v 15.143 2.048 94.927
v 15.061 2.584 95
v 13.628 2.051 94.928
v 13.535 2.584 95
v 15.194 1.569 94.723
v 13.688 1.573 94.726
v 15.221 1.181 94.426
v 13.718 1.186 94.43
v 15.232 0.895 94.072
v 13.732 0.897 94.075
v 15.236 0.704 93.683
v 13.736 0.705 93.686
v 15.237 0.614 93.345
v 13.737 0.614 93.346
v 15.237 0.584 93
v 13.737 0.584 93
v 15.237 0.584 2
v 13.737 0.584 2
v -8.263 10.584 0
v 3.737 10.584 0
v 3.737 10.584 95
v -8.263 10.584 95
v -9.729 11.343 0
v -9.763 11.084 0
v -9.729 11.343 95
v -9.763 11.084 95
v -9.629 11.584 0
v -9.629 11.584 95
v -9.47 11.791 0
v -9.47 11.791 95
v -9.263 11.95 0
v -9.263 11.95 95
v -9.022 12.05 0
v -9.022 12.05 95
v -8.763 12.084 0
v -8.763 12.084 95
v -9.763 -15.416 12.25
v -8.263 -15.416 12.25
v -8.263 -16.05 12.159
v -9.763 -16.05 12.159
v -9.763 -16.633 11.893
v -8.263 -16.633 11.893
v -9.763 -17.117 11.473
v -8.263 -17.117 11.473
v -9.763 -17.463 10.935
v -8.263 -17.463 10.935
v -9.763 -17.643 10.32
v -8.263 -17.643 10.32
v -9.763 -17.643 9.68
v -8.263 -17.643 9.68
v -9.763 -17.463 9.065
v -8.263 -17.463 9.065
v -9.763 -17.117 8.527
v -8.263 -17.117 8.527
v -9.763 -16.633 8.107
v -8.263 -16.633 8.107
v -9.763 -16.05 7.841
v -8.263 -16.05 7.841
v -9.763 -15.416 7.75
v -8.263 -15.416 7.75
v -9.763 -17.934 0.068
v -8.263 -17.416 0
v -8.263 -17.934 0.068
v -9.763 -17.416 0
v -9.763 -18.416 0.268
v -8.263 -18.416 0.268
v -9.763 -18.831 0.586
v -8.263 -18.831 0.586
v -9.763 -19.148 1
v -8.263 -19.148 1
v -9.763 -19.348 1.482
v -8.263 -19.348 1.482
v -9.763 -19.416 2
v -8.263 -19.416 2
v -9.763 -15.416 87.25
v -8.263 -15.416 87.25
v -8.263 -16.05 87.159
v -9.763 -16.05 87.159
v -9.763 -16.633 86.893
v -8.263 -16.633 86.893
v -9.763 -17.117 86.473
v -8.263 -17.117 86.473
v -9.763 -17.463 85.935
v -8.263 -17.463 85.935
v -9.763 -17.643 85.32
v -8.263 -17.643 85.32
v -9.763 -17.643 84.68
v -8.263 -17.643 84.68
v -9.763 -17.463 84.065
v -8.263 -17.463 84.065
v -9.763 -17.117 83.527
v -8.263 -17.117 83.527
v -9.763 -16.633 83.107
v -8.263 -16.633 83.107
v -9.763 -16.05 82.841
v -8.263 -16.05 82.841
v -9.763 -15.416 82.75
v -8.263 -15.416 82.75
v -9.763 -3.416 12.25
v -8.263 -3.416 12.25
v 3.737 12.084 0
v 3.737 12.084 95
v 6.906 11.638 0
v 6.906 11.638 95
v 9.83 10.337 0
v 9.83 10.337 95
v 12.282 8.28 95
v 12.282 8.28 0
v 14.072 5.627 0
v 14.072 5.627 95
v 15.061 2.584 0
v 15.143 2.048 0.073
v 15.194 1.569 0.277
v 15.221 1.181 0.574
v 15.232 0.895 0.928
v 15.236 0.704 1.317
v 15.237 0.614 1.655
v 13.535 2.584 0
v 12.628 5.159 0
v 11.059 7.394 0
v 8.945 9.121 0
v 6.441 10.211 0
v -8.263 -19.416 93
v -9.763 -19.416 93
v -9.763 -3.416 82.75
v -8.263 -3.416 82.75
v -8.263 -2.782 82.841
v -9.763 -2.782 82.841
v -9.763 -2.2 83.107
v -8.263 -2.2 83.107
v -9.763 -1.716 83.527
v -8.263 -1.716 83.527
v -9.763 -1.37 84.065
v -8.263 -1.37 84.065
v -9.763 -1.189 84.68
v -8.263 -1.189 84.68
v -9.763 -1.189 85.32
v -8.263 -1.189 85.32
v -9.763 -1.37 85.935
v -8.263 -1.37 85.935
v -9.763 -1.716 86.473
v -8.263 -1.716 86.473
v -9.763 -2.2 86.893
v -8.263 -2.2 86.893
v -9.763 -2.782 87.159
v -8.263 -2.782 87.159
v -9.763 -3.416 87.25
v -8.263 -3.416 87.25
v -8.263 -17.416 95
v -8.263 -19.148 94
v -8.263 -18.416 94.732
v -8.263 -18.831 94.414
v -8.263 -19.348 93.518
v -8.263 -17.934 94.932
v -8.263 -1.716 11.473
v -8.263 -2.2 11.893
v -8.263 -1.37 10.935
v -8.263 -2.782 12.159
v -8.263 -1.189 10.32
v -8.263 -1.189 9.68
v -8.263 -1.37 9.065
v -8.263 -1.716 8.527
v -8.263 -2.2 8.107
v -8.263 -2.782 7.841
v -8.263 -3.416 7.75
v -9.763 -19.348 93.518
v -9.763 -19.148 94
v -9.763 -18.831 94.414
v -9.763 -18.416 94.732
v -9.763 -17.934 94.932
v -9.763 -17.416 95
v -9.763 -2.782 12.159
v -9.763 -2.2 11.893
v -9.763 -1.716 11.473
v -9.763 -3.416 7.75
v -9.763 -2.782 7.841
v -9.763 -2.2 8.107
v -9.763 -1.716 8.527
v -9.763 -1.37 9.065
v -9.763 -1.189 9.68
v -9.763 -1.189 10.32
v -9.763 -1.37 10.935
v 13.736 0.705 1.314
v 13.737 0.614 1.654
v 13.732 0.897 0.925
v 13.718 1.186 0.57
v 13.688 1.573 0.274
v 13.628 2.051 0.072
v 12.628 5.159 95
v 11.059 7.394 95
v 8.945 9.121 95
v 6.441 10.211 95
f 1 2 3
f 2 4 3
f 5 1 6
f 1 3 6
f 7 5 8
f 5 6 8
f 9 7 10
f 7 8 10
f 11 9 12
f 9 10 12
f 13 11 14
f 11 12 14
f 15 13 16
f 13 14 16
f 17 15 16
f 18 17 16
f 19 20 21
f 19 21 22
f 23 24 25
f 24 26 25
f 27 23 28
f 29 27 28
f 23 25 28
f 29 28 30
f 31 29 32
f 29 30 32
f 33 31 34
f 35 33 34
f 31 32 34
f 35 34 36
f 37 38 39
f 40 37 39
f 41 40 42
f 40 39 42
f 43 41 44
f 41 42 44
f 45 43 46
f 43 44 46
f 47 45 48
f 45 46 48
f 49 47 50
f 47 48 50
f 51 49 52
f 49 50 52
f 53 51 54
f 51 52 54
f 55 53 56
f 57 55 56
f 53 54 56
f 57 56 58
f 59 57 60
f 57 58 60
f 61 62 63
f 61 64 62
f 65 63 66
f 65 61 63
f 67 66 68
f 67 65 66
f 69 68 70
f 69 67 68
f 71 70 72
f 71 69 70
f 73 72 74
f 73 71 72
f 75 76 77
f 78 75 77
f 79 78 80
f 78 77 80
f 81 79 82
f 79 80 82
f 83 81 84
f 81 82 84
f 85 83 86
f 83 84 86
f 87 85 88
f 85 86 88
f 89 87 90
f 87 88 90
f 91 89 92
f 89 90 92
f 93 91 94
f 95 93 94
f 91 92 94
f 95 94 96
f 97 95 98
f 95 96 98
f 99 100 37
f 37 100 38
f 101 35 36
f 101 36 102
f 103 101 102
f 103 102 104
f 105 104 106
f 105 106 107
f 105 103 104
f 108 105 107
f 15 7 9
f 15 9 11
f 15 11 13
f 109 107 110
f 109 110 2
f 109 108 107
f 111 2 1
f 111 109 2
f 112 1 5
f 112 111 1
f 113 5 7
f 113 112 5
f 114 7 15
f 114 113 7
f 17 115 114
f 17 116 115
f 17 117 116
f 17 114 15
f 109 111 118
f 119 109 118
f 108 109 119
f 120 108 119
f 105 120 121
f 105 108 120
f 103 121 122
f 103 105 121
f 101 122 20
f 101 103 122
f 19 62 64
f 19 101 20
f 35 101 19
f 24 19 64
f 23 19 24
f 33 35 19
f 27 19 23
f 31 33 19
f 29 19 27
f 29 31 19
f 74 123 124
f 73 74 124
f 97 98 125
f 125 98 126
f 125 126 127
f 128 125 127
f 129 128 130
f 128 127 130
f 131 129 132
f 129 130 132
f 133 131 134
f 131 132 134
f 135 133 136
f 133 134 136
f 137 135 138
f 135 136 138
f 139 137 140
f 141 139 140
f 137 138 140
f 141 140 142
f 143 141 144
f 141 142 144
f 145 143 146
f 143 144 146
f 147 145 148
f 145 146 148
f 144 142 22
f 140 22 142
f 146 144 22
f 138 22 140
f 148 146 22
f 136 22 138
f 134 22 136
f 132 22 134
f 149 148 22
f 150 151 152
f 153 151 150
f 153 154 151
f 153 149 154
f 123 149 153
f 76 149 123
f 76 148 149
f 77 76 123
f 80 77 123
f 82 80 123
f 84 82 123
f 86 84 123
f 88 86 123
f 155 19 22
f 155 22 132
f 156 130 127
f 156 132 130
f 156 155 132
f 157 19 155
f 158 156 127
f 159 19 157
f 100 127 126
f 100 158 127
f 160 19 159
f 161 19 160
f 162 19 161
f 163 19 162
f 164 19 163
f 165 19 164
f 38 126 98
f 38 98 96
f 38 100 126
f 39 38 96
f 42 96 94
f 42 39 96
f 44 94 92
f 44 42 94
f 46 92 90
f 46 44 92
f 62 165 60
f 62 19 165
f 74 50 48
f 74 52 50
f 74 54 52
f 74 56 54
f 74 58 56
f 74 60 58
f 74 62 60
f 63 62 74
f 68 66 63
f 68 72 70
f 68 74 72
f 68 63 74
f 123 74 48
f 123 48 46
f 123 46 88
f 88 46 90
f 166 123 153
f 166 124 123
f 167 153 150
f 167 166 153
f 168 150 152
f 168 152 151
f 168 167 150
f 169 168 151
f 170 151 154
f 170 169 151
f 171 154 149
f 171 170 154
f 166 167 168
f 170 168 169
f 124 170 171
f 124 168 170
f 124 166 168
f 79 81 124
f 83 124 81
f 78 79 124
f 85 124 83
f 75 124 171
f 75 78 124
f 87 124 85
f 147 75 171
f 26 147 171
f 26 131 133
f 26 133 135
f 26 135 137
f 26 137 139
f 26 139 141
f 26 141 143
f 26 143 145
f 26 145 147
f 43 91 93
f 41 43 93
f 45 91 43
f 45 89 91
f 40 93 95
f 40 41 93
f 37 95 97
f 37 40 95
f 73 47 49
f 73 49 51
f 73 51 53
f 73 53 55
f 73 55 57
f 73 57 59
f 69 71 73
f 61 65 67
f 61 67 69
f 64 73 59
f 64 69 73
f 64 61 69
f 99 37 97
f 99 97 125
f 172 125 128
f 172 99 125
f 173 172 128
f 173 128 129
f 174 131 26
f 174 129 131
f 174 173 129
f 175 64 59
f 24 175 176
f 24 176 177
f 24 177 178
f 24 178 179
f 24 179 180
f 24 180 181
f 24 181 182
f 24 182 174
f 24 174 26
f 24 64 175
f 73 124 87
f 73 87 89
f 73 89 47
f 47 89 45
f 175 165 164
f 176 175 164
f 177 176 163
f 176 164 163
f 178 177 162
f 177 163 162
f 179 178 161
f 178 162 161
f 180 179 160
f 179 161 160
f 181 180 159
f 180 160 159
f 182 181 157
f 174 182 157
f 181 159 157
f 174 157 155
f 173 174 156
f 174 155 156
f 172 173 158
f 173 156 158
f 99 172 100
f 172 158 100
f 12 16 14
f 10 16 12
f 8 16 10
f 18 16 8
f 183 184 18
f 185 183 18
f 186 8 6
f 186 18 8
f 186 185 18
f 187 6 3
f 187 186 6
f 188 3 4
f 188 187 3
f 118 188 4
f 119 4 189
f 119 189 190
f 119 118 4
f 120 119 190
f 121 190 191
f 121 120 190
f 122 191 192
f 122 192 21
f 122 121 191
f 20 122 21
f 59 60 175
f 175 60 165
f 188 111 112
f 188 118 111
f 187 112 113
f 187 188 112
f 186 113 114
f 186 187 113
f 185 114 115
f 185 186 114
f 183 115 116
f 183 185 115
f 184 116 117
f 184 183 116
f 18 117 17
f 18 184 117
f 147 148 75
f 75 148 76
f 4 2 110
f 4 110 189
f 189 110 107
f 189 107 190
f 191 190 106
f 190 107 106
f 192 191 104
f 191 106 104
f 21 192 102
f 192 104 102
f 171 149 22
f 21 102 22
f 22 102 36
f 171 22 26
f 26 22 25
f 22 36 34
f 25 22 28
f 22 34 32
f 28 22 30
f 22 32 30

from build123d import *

# Parameters (mm, degrees)
BOSS_EXTRUDE1_DEPTH = 95
FILLET1_R           = 1
FILLET2_R           = 2
CUT_EXTRUDE1_DEPTH  = 2.5


with BuildPart() as part:
    # Sketch1 → Boss-Extrude1 (new body)
    with BuildSketch(Plane.XY):
        with BuildLine():
            Line((-9.763392857, -19.416294643), (-9.763392857, 12.083705357))
            Line((-9.763392857, 12.083705357), (3.736607143, 12.083705357))
            ThreePointArc((3.736607143, 12.083705357), (11.868335127, 8.715433341), (15.236607143, 0.583705357))
            Line((15.236607143, 0.583705357), (13.736607143, 0.583705357))
            ThreePointArc((13.736607143, 0.583705357), (10.807674955, 7.654773169), (3.736607143, 10.583705357))
            Line((3.736607143, 10.583705357), (-8.263392857, 10.583705357))
            Line((-8.263392857, 10.583705357), (-8.263392857, -19.416294643))
            Line((-8.263392857, -19.416294643), (-9.763392857, -19.416294643))
        make_face()
    extrude(amount=BOSS_EXTRUDE1_DEPTH)

    # Fillet1
    fillet1_edges = [part.edges().sort_by_distance(p)[0] for p in [
        (-9.763392857, 12.083705357, 47.5),
    ]]
    fillet(fillet1_edges, radius=FILLET1_R)

    # Fillet2
    fillet2_edges = [part.edges().sort_by_distance(p)[0] for p in [
        (-9.013392857, -19.416294643, 0),
        (14.486607143, 0.583705357, 95),
        (-9.013392857, -19.416294643, 95),
        (14.486607143, 0.583705357, 0),
    ]]
    fillet(fillet2_edges, radius=FILLET2_R)

    # Sketch2 → Cut-Extrude1 (cut, through all)
    with BuildSketch(Plane(origin=(-8.263392857, 0, 0), x_dir=(0, 0, -1), z_dir=(1, 0, 0))):
        with BuildLine():
            Line((-87.25, -3.416294643), (-87.25, -15.416294643))
            ThreePointArc((-87.25, -15.416294643), (-85, -17.666294643), (-82.75, -15.416294643))
            Line((-82.75, -15.416294643), (-82.75, -3.416294643))
            ThreePointArc((-82.75, -3.416294643), (-85, -1.166294643), (-87.25, -3.416294643))
        make_face()
        with BuildLine():
            Line((-12.25, -3.416294643), (-12.25, -15.416294643))
            ThreePointArc((-12.25, -15.416294643), (-10, -17.666294643), (-7.75, -15.416294643))
            Line((-7.75, -15.416294643), (-7.75, -3.416294643))
            ThreePointArc((-7.75, -3.416294643), (-10, -1.166294643), (-12.25, -3.416294643))
        make_face()
    extrude(amount=-CUT_EXTRUDE1_DEPTH, mode=Mode.SUBTRACT)


solid = part.part
